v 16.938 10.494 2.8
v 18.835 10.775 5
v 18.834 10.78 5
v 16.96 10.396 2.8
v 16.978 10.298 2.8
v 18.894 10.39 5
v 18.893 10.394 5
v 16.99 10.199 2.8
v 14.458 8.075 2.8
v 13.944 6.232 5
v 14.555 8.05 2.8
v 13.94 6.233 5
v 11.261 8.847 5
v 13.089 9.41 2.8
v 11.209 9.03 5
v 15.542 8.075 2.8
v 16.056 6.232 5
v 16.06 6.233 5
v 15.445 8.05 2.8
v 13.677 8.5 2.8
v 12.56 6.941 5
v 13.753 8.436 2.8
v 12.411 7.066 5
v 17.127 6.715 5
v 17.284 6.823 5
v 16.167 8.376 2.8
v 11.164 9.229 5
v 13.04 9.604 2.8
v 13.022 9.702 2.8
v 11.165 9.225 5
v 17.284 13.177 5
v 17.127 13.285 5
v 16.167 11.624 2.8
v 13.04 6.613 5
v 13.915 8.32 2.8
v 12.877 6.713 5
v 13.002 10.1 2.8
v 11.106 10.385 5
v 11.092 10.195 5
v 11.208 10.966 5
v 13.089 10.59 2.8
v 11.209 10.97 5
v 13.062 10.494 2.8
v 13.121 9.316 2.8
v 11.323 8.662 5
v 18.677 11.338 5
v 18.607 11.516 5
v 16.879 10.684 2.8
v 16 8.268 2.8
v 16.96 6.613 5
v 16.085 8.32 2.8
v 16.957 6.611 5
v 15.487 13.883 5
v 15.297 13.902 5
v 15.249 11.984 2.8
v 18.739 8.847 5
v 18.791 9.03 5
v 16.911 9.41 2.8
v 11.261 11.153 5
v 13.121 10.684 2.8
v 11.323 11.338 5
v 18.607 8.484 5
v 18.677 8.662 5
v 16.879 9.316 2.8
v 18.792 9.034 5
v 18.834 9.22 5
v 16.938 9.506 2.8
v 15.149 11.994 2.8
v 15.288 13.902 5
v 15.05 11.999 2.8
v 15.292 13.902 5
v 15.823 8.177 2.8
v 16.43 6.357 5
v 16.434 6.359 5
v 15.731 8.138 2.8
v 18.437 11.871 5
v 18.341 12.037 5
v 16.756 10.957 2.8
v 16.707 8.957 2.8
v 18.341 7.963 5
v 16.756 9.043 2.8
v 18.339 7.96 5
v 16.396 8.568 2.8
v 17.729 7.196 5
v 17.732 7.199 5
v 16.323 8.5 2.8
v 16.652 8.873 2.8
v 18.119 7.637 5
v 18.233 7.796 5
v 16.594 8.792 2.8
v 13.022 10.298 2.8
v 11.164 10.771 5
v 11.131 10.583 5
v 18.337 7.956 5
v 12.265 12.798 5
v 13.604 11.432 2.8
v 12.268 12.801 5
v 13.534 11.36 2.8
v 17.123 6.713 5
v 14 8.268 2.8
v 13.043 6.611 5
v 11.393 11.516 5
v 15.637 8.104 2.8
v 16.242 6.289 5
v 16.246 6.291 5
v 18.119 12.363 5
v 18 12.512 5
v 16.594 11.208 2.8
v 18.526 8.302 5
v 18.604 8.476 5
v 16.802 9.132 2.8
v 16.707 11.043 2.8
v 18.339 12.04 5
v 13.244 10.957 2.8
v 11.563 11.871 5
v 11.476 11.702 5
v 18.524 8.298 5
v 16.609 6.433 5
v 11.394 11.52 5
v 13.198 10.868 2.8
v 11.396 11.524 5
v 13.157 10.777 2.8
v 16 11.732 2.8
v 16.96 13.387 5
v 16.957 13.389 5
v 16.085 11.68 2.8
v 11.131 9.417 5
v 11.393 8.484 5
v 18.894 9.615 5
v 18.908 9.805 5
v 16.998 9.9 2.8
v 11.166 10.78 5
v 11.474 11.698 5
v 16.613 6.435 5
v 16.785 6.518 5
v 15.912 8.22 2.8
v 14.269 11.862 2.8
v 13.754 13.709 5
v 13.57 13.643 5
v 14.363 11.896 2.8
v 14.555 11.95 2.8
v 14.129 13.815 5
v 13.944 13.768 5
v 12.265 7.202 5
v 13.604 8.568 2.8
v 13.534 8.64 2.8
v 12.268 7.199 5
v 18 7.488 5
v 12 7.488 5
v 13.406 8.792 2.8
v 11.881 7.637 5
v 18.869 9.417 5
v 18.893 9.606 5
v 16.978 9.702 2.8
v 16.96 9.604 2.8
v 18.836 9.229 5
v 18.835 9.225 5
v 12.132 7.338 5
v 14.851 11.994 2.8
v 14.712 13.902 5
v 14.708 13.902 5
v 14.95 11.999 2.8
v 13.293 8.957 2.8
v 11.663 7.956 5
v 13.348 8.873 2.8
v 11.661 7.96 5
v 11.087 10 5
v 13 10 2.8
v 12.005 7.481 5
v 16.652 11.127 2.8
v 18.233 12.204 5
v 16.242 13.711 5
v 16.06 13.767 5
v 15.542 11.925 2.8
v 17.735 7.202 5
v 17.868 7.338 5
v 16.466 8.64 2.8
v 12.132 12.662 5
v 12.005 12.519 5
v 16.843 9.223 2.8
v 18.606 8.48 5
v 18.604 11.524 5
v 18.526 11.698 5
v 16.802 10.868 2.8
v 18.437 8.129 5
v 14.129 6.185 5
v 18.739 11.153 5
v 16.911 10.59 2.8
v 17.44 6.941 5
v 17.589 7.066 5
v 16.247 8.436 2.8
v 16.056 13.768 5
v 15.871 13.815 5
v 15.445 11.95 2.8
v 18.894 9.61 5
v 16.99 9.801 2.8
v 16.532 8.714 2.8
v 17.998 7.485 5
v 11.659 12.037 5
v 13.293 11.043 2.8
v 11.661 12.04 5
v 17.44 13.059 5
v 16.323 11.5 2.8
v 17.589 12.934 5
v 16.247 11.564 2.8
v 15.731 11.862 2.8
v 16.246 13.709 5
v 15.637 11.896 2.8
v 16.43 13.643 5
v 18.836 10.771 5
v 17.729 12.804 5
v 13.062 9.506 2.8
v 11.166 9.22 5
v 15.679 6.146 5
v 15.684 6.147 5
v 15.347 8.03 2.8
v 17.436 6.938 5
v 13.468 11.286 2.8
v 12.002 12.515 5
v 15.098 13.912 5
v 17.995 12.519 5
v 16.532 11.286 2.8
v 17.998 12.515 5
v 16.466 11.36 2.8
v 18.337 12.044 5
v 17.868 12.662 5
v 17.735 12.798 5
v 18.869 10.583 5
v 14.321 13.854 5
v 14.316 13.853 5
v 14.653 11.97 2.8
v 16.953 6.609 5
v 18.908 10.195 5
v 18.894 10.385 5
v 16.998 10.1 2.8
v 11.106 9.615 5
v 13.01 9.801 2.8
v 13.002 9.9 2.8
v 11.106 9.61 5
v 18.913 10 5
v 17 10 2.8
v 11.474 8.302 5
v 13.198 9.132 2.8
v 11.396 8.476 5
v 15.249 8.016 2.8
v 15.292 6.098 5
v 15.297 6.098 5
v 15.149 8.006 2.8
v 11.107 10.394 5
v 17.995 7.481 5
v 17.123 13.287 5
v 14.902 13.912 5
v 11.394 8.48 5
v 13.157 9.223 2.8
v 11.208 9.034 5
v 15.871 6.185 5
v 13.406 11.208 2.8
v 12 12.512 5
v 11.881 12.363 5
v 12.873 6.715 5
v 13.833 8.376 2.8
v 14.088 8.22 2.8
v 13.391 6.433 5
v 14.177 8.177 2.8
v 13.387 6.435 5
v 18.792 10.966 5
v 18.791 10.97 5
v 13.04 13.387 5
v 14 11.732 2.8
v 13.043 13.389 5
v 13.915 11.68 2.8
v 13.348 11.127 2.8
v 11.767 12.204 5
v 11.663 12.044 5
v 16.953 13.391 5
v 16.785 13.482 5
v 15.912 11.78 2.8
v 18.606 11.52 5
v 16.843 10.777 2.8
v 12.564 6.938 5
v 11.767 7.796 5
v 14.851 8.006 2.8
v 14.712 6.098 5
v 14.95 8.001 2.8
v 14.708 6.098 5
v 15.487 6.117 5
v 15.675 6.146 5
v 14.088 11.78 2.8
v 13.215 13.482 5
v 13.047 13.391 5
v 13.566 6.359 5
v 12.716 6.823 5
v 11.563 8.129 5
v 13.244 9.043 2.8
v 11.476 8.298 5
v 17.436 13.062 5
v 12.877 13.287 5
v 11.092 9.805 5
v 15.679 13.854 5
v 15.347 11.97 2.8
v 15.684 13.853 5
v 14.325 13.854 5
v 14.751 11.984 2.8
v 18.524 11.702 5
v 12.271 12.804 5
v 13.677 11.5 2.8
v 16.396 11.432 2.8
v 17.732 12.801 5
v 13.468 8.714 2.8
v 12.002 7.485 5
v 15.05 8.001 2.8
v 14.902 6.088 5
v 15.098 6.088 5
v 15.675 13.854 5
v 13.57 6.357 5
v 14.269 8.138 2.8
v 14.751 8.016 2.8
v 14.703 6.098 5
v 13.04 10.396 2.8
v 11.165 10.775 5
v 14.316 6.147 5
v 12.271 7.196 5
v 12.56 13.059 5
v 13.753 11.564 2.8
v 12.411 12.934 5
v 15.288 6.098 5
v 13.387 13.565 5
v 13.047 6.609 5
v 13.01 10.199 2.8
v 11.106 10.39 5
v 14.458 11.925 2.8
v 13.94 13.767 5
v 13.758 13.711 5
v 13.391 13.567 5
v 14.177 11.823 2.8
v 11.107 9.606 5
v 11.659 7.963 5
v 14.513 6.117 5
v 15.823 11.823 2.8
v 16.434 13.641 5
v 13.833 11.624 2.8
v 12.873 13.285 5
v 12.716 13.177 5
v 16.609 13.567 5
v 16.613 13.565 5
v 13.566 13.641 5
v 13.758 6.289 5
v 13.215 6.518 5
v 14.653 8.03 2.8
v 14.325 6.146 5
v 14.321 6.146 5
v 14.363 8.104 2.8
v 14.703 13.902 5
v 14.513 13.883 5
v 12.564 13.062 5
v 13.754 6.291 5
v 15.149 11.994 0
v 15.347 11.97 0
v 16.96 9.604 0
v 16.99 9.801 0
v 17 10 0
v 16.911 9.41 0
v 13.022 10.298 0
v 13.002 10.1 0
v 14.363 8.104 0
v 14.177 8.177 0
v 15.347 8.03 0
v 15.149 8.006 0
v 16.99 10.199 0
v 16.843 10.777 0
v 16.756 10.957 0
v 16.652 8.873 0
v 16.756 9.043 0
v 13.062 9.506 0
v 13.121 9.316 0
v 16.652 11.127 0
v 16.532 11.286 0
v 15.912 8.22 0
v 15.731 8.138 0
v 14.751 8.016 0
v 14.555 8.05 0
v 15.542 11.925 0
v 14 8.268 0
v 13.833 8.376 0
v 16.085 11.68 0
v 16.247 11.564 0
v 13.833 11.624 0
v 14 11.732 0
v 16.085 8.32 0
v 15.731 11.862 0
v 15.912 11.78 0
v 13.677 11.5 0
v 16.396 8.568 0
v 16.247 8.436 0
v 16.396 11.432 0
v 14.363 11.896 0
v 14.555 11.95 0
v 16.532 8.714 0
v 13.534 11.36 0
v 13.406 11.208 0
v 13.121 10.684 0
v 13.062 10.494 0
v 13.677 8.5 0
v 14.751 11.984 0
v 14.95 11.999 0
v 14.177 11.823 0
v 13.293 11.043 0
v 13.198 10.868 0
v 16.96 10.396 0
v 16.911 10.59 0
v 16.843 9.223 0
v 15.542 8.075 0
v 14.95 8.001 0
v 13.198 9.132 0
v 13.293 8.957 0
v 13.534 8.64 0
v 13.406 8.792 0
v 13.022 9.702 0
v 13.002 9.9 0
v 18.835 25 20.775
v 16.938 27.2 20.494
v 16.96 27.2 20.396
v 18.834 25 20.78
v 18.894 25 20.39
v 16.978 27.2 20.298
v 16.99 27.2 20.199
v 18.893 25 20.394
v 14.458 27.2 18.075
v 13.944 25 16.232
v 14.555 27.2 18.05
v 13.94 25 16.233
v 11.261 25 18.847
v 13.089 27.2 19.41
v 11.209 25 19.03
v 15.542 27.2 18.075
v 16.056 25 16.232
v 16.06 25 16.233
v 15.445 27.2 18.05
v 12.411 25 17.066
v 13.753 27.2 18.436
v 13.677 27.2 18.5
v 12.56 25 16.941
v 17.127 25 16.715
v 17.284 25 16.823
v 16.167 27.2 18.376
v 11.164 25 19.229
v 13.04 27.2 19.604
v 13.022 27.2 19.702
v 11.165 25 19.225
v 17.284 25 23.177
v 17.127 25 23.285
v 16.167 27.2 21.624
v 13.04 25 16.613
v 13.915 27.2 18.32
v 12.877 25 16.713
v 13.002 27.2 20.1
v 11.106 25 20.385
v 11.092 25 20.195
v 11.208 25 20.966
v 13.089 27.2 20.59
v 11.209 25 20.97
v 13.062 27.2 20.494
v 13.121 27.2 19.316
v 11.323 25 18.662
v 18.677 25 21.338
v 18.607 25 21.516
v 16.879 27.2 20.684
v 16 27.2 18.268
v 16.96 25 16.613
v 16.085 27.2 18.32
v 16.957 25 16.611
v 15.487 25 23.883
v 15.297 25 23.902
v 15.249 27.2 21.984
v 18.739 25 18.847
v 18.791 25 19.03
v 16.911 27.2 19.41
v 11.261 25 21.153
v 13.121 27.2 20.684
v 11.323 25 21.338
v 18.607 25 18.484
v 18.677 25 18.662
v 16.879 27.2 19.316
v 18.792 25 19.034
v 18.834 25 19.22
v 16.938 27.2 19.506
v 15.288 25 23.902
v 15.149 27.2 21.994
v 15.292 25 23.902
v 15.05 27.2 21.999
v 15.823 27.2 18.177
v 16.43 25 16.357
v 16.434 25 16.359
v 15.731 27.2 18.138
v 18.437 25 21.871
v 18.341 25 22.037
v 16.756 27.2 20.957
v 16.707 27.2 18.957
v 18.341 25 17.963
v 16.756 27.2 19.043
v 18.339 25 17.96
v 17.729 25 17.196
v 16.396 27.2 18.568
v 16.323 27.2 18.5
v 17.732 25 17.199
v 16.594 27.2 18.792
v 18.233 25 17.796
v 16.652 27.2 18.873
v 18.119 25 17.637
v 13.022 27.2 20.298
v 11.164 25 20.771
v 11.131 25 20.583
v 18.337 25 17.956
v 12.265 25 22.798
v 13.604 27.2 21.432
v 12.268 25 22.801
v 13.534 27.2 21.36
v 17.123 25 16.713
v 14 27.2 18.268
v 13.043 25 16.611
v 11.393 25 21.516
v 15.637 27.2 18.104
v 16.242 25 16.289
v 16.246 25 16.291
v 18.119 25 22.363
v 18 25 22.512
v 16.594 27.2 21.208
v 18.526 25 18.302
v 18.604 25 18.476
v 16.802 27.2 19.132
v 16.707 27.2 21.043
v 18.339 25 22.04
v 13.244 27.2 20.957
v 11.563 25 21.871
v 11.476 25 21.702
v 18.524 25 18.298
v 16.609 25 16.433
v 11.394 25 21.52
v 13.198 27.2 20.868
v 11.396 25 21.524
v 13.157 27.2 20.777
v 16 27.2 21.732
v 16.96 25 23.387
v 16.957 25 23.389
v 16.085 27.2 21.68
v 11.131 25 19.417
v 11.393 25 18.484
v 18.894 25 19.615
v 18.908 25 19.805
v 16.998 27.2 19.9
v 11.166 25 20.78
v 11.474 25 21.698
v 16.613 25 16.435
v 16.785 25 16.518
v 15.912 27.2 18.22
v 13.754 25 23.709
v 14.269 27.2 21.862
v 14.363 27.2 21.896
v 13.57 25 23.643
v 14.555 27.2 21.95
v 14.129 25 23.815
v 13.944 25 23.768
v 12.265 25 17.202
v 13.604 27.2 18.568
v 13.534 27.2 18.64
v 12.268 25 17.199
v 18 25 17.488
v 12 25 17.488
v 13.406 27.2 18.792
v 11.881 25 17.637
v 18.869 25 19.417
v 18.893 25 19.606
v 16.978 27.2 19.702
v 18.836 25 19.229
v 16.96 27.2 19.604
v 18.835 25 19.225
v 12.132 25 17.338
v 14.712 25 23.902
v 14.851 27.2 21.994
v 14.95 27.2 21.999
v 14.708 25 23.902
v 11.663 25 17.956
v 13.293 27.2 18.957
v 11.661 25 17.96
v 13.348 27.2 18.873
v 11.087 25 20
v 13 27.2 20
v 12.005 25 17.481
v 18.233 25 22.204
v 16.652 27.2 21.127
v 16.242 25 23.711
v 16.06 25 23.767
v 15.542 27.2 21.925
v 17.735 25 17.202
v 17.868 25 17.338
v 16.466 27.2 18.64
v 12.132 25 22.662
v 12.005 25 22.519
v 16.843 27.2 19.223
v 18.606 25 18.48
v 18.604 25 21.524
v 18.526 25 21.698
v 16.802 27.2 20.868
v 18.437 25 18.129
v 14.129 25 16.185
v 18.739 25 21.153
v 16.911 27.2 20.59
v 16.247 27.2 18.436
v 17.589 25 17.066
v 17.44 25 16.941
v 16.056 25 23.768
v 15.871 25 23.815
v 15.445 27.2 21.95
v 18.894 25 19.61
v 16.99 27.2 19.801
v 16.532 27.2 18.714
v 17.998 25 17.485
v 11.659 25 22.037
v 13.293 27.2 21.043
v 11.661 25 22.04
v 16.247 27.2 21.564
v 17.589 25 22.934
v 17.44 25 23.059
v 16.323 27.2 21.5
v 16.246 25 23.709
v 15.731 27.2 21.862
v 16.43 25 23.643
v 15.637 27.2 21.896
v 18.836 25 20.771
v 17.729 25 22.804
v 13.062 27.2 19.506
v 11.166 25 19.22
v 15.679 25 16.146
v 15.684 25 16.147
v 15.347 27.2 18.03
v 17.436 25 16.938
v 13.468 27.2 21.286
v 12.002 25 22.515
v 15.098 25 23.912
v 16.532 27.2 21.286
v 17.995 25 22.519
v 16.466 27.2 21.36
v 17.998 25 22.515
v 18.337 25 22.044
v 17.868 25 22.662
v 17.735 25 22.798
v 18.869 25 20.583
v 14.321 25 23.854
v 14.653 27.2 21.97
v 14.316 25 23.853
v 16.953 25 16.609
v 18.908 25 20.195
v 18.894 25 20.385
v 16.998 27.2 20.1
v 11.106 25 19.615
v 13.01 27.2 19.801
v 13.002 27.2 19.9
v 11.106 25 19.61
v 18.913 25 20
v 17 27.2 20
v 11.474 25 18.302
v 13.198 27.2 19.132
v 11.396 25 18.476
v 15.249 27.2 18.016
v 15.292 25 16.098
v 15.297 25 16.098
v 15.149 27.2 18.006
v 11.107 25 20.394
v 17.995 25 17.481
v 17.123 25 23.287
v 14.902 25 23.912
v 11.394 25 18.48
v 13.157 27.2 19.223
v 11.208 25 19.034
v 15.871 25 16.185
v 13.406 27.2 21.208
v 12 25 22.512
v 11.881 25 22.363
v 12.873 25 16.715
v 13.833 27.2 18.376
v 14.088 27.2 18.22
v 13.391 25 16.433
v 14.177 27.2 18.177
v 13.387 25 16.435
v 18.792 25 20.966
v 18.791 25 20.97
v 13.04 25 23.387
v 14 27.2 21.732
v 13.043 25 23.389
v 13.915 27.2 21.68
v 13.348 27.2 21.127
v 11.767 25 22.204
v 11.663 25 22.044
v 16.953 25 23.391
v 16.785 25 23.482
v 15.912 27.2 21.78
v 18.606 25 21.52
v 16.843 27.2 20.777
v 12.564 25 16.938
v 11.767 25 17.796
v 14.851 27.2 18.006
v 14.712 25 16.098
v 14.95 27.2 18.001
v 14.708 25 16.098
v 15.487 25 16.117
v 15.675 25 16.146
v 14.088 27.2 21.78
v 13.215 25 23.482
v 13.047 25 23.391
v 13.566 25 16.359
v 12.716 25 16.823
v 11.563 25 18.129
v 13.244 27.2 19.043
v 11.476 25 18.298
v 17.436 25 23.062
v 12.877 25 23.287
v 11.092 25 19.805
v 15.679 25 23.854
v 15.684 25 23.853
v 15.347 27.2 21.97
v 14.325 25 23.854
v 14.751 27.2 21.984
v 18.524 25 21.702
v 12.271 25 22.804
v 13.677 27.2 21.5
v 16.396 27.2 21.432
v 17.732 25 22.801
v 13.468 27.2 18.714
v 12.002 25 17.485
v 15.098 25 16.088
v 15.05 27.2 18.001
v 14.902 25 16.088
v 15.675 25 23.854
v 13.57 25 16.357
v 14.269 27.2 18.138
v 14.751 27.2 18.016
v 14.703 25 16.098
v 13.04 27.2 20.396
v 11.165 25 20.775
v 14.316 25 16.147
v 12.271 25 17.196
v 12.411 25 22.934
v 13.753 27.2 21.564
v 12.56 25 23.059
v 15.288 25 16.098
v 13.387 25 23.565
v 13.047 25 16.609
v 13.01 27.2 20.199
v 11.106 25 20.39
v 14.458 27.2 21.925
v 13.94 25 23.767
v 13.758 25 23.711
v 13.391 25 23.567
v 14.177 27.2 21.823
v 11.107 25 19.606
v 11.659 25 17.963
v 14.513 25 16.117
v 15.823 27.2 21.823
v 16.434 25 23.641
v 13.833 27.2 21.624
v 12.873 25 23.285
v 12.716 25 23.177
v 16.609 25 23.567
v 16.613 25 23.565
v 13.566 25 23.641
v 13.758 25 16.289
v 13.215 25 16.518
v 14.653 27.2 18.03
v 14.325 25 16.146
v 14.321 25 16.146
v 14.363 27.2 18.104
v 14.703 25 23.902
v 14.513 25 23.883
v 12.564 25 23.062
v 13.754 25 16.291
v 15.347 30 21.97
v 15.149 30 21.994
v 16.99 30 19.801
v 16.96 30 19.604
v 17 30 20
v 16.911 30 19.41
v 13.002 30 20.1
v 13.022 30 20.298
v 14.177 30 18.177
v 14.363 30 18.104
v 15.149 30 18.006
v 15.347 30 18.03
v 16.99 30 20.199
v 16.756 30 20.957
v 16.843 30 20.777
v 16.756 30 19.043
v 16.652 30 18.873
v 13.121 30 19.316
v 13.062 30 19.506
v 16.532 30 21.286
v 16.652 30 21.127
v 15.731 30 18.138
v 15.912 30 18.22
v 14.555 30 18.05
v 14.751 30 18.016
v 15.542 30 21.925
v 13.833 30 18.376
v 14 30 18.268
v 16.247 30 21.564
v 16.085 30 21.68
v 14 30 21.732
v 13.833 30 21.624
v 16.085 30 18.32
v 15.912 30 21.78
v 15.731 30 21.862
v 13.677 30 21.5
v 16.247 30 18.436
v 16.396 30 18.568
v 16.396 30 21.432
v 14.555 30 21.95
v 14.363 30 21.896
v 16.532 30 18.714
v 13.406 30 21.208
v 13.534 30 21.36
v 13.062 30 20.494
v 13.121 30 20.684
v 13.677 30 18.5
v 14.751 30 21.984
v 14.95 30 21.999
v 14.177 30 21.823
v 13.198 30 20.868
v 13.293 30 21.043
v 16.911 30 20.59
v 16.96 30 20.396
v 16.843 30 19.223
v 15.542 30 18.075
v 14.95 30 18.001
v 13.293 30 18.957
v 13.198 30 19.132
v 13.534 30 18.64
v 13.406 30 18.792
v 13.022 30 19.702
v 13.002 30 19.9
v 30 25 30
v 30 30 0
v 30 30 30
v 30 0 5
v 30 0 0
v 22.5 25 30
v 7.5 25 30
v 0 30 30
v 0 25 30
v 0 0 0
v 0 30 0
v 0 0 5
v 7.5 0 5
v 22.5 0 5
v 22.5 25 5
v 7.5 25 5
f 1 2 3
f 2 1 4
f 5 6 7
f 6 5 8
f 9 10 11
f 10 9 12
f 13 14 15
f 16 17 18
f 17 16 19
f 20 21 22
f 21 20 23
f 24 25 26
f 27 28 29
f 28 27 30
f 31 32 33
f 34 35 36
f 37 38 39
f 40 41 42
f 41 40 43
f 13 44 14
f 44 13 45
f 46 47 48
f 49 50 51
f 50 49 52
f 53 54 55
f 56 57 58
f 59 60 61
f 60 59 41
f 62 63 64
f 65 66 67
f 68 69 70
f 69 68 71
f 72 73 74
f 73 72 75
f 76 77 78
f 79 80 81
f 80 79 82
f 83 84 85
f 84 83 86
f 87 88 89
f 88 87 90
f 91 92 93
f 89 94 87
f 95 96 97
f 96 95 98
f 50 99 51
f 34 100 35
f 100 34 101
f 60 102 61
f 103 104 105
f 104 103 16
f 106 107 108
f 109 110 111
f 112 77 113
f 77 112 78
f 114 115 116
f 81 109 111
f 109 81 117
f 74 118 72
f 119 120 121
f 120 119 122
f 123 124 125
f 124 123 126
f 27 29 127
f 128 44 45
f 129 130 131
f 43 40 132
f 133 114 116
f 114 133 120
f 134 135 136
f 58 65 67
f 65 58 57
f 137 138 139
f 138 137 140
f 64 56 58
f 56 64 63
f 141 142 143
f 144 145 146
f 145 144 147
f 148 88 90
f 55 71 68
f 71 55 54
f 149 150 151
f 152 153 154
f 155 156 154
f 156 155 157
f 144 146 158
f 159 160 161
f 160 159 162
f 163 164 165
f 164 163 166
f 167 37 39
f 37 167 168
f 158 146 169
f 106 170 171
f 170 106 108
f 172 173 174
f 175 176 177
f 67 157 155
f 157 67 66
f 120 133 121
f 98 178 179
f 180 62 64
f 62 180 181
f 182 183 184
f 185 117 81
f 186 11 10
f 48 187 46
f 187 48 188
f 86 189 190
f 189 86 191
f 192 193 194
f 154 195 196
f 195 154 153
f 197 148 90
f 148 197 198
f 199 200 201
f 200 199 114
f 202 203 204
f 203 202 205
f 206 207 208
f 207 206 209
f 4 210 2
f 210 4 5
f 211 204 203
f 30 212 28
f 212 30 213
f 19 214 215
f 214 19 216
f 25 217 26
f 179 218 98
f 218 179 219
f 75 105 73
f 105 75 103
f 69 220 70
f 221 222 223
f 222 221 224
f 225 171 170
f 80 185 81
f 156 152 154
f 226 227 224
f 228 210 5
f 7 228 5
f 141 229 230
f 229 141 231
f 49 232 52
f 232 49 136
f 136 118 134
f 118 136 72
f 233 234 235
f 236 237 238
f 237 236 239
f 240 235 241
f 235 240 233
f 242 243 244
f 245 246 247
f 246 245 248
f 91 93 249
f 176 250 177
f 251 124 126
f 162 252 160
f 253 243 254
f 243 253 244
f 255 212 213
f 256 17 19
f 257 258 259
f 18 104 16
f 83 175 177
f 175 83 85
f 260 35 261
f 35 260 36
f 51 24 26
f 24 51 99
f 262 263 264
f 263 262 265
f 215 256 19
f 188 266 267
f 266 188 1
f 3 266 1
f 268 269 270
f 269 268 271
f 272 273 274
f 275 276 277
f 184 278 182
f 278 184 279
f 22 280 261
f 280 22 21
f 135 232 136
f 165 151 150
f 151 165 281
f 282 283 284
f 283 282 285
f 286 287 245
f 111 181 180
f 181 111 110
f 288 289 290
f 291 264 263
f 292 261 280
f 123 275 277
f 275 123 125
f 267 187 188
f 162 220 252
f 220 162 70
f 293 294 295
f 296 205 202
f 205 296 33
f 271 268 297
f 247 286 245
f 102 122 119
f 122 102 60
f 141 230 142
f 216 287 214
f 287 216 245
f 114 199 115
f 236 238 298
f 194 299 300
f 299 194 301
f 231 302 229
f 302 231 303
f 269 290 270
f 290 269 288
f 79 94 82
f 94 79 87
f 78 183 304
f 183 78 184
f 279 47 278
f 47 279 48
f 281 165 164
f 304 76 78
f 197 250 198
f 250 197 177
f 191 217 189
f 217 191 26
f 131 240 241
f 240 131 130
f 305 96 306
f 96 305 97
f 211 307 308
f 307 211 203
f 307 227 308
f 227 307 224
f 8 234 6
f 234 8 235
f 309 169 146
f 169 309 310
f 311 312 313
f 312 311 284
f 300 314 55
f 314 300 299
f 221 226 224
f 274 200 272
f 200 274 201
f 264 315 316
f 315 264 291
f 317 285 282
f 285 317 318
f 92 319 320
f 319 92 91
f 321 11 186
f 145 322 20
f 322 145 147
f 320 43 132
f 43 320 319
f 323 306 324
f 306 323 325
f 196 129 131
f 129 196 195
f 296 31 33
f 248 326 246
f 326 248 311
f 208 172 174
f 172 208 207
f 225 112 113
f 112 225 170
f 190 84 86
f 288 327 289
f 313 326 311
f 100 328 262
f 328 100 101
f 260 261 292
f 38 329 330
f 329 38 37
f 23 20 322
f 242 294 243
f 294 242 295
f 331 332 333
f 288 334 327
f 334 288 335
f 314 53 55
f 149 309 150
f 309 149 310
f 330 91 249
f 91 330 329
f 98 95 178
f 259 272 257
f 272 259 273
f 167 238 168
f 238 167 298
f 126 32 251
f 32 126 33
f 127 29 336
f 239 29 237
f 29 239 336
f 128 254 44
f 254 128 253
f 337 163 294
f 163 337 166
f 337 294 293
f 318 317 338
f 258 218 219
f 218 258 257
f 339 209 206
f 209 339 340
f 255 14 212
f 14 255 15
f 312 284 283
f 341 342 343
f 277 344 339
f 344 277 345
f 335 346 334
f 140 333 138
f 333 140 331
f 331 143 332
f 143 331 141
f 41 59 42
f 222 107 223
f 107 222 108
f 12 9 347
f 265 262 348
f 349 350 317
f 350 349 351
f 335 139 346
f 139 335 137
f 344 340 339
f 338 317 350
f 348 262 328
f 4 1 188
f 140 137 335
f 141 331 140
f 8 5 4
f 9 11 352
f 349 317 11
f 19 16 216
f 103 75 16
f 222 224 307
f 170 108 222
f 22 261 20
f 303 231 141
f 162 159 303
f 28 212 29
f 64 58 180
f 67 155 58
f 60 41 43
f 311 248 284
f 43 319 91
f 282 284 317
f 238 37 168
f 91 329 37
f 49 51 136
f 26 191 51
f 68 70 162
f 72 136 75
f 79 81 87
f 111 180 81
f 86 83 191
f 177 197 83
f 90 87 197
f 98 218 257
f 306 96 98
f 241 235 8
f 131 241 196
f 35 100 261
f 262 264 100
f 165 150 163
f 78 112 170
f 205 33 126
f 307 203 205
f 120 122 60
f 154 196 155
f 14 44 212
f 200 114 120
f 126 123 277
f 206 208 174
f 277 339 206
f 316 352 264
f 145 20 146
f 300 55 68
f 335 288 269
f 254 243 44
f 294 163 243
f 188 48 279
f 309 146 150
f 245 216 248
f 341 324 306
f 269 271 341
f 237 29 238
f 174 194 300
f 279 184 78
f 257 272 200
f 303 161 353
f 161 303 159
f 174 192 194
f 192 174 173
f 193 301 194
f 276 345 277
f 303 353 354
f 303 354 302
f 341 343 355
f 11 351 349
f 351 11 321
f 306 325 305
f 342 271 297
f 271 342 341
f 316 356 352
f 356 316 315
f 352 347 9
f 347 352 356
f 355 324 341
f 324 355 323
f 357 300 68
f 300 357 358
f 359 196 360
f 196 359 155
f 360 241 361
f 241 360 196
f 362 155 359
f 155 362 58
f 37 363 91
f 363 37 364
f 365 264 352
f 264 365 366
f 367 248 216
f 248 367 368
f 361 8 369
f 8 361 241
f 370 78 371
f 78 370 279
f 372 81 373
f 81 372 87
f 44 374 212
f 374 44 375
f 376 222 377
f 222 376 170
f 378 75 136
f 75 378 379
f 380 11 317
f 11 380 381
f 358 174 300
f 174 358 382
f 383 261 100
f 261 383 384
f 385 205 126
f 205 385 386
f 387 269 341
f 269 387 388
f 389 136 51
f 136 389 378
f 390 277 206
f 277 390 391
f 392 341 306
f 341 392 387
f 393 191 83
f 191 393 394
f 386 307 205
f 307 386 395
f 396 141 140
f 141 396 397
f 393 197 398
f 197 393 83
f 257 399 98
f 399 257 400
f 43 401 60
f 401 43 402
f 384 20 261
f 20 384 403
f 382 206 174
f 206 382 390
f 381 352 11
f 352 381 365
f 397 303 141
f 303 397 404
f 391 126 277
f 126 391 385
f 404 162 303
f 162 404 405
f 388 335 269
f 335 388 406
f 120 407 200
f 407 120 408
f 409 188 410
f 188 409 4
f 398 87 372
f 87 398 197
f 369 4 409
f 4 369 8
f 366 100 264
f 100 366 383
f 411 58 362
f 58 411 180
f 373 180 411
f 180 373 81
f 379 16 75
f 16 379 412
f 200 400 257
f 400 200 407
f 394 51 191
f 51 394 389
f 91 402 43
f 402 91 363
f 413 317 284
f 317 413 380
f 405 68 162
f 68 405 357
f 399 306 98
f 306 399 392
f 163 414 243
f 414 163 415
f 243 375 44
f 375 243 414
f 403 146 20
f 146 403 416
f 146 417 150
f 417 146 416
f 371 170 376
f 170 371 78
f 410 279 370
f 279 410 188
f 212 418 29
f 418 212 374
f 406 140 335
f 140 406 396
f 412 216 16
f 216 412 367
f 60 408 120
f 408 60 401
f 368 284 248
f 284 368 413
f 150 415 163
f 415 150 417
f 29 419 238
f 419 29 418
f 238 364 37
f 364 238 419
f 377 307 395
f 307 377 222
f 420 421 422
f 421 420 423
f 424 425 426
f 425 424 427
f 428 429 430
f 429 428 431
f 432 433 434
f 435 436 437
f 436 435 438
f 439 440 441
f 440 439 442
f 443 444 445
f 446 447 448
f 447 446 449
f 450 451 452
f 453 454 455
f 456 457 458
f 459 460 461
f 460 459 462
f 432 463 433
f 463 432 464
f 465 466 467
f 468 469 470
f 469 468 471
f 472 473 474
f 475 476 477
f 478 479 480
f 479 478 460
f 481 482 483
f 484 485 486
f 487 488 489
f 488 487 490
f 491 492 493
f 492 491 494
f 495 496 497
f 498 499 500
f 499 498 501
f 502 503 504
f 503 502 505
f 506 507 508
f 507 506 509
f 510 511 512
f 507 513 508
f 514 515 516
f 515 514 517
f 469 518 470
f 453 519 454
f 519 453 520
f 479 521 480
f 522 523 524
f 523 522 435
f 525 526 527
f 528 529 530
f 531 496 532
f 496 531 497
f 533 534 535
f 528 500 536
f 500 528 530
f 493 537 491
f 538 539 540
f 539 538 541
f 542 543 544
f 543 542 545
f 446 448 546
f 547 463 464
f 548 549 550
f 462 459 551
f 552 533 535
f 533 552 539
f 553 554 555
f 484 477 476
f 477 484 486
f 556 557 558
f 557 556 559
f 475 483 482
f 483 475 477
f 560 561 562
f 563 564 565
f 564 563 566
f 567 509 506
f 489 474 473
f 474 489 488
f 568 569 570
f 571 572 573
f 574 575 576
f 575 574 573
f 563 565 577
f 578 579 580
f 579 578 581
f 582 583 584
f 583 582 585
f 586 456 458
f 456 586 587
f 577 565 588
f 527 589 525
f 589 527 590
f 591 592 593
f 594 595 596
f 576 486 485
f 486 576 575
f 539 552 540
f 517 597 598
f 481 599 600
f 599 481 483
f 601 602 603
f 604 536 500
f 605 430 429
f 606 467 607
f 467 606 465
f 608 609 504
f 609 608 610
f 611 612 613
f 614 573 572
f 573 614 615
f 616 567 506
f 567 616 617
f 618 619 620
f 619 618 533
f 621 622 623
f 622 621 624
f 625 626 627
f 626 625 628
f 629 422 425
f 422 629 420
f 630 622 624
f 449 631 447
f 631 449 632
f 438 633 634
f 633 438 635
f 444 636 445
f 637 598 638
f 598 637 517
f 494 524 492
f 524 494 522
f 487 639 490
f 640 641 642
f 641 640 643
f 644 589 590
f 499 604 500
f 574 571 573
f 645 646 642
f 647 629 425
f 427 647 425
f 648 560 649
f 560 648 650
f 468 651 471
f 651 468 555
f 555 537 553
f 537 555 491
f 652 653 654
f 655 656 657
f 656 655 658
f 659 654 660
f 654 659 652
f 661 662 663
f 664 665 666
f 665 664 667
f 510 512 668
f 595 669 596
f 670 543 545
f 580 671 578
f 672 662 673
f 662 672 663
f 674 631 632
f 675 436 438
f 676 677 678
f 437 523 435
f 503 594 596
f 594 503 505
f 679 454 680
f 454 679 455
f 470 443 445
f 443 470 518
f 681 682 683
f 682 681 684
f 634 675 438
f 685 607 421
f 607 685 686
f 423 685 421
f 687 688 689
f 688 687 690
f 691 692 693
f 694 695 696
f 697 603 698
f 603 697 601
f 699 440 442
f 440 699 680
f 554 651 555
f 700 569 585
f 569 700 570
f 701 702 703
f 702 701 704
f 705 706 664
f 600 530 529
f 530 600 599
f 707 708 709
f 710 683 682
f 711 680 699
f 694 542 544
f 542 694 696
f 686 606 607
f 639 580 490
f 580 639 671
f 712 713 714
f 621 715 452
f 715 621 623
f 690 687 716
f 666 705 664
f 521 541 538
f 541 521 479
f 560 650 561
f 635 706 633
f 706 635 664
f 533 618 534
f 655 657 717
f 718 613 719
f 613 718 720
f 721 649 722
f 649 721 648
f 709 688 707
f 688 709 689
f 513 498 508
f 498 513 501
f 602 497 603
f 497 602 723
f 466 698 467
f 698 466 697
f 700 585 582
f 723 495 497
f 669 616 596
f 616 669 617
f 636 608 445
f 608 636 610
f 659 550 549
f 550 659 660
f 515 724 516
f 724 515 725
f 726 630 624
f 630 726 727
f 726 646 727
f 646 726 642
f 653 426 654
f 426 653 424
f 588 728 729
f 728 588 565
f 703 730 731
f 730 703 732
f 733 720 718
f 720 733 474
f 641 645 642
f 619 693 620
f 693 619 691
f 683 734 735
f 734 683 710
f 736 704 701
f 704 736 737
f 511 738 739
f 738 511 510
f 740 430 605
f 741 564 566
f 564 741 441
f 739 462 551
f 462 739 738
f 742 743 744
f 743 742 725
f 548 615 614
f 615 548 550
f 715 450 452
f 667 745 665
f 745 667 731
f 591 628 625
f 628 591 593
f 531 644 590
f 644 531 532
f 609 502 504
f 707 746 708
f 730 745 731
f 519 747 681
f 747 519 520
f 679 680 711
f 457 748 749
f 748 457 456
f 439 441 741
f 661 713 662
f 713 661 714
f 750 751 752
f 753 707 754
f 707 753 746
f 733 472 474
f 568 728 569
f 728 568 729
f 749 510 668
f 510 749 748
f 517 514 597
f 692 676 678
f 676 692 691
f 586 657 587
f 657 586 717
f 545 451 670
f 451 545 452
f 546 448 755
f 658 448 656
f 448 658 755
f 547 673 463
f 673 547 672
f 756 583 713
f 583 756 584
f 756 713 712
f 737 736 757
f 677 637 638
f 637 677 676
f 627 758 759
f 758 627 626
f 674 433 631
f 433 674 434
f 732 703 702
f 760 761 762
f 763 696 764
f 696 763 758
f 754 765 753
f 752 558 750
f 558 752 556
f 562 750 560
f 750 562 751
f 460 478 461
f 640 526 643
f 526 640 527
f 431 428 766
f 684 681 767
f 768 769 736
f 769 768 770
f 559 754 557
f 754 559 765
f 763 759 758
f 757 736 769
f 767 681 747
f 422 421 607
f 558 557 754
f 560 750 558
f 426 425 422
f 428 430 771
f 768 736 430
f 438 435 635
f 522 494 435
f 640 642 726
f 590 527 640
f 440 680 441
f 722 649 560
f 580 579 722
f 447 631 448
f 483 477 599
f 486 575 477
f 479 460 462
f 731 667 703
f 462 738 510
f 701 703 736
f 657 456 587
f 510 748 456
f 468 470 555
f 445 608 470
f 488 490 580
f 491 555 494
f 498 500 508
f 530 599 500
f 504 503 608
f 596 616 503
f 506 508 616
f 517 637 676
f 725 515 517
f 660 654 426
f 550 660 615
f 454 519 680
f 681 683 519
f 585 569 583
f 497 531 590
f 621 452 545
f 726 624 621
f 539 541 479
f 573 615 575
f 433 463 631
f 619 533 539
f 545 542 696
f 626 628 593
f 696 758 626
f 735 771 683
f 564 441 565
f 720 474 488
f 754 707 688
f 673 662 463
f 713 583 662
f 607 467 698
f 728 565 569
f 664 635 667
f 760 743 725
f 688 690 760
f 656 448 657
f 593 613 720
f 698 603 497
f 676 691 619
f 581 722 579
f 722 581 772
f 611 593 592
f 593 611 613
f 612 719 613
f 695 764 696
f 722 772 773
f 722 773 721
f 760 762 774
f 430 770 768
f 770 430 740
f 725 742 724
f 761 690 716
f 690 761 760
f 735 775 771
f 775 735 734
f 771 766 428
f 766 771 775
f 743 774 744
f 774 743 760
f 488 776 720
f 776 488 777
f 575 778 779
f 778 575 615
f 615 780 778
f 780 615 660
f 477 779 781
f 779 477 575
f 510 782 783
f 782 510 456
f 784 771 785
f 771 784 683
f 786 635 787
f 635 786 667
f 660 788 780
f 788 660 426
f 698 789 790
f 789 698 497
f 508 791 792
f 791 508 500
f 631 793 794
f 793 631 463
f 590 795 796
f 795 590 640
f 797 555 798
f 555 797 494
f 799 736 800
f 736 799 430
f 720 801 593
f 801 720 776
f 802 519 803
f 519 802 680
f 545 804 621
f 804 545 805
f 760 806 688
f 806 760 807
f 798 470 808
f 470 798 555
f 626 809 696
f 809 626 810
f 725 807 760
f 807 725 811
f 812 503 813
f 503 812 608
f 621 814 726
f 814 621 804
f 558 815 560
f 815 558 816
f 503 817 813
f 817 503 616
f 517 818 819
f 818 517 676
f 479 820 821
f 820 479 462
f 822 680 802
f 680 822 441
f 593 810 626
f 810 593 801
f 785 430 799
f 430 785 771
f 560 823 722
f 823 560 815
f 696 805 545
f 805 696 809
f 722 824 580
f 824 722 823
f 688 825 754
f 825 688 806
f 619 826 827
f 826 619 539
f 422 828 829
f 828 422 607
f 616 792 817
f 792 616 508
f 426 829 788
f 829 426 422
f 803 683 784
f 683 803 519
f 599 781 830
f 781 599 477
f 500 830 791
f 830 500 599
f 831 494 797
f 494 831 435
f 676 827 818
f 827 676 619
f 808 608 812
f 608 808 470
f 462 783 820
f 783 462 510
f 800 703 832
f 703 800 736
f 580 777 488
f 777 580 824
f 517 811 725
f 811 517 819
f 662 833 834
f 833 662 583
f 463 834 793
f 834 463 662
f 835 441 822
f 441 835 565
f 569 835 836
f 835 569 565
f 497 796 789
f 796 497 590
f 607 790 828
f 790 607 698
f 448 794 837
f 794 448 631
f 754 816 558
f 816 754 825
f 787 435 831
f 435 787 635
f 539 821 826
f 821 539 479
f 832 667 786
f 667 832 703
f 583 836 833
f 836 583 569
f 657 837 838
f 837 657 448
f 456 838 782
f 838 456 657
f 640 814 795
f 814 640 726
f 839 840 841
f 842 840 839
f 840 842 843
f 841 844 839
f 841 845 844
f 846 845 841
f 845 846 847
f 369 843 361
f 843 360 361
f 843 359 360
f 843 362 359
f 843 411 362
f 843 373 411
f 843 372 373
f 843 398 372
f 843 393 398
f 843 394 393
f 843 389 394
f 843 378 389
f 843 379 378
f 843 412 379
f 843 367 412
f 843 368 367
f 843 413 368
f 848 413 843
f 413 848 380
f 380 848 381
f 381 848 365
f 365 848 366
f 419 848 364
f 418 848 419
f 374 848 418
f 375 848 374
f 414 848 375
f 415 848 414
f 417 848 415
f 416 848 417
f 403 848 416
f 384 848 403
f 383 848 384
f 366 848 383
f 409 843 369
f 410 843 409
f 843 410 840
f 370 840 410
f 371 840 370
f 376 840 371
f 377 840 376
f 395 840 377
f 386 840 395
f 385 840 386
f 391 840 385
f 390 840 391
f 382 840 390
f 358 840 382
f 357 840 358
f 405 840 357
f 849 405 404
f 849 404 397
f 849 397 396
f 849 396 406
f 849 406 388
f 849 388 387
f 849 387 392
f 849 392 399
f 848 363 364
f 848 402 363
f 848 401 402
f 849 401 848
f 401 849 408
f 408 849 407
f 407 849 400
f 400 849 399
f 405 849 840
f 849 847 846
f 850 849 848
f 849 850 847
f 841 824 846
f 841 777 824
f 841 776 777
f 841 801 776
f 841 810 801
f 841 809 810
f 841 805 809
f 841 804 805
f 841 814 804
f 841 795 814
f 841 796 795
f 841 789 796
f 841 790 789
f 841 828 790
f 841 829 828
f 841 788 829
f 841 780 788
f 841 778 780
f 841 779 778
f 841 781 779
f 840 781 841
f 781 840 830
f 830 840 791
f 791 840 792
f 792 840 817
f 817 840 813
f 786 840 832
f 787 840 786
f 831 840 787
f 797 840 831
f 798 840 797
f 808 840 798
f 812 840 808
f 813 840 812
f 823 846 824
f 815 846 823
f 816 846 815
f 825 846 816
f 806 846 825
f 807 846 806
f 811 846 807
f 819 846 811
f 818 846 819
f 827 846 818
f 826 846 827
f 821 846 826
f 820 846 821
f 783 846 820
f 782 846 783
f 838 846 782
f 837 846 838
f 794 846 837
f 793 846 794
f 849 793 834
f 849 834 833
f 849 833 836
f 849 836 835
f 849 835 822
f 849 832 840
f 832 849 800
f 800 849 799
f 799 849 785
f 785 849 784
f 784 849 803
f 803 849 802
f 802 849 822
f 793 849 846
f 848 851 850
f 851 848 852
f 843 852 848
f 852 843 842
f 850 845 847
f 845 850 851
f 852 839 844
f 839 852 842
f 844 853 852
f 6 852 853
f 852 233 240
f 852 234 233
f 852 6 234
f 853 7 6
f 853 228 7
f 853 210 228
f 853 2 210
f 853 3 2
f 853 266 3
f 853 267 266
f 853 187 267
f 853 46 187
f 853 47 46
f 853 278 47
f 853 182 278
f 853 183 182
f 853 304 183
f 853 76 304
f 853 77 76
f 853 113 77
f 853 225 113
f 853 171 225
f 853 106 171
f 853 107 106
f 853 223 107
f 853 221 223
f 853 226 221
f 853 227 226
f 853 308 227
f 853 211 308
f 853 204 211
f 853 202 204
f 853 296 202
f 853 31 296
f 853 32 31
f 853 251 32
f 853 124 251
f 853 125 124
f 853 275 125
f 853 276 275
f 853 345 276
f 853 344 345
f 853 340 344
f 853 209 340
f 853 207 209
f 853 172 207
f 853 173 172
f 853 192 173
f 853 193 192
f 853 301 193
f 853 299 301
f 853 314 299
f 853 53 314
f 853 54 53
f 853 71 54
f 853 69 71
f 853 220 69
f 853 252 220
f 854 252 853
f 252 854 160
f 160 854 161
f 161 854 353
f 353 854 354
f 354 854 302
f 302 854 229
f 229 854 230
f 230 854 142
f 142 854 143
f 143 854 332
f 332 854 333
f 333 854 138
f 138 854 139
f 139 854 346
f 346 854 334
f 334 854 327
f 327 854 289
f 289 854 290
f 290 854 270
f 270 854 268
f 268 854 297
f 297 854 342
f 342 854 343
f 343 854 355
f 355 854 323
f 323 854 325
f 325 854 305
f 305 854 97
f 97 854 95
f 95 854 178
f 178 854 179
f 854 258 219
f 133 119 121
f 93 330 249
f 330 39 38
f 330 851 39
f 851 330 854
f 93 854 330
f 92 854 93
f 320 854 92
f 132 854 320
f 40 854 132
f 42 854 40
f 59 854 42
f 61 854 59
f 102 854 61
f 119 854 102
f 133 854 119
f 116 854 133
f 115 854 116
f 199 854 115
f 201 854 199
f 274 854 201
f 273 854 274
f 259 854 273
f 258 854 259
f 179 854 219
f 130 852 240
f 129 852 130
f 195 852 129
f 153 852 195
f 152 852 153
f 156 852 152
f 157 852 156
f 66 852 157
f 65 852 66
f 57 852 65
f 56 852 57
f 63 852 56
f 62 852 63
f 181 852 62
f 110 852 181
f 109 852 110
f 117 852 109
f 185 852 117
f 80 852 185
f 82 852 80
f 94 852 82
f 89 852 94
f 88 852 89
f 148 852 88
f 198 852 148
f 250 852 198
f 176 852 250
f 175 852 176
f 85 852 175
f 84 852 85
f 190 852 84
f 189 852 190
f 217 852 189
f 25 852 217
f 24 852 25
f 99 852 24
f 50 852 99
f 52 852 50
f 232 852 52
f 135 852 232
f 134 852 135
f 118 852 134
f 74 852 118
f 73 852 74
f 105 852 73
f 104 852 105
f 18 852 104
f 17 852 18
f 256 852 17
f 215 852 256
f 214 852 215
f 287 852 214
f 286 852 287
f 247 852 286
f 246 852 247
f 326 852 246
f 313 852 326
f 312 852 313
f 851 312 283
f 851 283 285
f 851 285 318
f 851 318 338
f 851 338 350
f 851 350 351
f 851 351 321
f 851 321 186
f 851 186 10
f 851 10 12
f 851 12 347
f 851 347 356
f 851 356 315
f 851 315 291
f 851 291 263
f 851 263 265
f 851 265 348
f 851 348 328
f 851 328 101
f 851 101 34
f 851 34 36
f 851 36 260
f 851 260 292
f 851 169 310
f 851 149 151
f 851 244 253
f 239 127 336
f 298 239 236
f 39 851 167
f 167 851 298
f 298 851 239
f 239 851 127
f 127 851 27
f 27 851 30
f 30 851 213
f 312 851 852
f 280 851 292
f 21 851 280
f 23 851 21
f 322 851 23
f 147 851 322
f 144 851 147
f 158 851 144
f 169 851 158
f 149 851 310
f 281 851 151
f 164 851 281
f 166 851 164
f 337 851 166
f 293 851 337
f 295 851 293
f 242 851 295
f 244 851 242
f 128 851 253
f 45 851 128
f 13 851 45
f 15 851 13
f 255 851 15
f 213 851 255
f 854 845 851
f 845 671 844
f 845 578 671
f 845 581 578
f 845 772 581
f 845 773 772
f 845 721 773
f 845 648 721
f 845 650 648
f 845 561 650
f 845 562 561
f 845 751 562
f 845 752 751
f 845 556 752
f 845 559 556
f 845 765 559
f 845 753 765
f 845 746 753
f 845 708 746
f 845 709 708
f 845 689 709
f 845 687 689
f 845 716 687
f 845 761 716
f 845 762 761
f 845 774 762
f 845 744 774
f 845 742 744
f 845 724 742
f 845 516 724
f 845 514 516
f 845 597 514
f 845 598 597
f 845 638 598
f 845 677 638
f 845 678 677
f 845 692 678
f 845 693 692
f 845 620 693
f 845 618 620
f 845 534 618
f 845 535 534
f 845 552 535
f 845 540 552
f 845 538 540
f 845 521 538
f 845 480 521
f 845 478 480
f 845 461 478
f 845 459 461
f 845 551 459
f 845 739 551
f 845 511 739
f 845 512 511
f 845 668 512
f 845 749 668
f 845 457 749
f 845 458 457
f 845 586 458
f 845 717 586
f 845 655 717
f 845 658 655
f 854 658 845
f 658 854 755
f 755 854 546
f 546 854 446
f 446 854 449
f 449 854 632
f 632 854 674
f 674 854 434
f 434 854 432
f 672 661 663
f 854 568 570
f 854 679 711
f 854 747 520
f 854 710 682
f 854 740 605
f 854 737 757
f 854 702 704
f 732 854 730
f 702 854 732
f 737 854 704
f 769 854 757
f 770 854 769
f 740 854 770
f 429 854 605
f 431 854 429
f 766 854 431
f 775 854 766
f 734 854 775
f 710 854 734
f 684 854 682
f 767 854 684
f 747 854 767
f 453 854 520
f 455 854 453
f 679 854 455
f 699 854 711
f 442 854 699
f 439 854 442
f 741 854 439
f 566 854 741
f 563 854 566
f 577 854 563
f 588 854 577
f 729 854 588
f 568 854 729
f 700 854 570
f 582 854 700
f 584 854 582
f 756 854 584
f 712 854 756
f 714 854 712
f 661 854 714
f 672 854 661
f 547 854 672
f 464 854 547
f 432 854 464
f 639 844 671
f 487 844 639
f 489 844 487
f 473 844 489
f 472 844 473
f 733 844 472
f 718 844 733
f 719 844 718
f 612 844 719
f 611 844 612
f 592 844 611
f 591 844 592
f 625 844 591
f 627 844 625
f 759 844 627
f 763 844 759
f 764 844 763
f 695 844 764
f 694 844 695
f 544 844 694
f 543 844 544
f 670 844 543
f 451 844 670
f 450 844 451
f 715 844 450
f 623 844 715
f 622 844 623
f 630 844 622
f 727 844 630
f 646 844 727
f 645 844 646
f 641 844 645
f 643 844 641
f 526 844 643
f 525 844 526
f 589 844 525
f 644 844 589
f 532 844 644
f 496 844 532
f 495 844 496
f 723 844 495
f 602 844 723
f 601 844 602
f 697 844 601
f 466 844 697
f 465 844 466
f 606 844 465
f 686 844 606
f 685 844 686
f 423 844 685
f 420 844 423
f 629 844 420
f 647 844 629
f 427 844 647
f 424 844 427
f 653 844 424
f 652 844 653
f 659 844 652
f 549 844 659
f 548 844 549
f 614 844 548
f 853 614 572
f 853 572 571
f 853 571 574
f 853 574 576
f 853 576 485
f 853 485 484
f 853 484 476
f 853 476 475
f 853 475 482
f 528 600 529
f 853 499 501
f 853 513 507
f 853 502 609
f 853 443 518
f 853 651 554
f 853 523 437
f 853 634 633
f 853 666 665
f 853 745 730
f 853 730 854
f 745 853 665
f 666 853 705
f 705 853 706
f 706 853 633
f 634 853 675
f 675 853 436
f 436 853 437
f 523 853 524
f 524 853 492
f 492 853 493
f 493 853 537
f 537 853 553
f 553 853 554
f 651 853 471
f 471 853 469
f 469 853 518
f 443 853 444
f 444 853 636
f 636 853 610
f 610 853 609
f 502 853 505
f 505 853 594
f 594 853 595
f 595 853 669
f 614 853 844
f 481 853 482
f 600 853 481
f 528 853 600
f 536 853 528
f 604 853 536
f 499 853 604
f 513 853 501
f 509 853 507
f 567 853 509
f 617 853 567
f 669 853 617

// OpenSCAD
// thickness of back and base, and minimum thickness of side walls
wall_thickness = 5;
// width of cavity within
internal_width = 15;
// external width won't have any effect unless it's greater than internal_width + 2*wall_thickness
external_width = 30;
// height and base length
base_length = 30;


// metric size of flat head screws, I have a box of 4 x 20mm screws
screw = 4;
screw_length = 20;

// customizable variables end here

module screw(d, l) {
    // head
    union() {
        cylinder(h=2.3, r1=d, r2=d/2);
        cylinder(h=l, r=d/2);
    }
}

$fs=0.2;
$fa=1;

part_width = max(wall_thickness*2 + internal_width, external_width);
width_wall = max(wall_thickness, (part_width - internal_width)/2);

difference() {
    cube([part_width, base_length, base_length], center=false);
    // cut away half to make triangle with correct wall thickness
    translate([-part_width/part_width, -wall_thickness, 0]) rotate([45, 0, 0])
        cube([2*part_width, 2*base_length, 2*base_length], center=false);
    // create cavity within
    translate([width_wall, -wall_thickness, wall_thickness])
        cube([internal_width, base_length, base_length]);
    translate([width_wall + internal_width/2, base_length/2 - wall_thickness, wall_thickness + 0.1]) 
        rotate([180, 0, 0]) screw(screw, screw_length);
    translate([width_wall + internal_width/2, base_length - wall_thickness - 0.1, wall_thickness + base_length/2]) 
        rotate([270, 0, 0]) screw(screw, screw_length);
}
